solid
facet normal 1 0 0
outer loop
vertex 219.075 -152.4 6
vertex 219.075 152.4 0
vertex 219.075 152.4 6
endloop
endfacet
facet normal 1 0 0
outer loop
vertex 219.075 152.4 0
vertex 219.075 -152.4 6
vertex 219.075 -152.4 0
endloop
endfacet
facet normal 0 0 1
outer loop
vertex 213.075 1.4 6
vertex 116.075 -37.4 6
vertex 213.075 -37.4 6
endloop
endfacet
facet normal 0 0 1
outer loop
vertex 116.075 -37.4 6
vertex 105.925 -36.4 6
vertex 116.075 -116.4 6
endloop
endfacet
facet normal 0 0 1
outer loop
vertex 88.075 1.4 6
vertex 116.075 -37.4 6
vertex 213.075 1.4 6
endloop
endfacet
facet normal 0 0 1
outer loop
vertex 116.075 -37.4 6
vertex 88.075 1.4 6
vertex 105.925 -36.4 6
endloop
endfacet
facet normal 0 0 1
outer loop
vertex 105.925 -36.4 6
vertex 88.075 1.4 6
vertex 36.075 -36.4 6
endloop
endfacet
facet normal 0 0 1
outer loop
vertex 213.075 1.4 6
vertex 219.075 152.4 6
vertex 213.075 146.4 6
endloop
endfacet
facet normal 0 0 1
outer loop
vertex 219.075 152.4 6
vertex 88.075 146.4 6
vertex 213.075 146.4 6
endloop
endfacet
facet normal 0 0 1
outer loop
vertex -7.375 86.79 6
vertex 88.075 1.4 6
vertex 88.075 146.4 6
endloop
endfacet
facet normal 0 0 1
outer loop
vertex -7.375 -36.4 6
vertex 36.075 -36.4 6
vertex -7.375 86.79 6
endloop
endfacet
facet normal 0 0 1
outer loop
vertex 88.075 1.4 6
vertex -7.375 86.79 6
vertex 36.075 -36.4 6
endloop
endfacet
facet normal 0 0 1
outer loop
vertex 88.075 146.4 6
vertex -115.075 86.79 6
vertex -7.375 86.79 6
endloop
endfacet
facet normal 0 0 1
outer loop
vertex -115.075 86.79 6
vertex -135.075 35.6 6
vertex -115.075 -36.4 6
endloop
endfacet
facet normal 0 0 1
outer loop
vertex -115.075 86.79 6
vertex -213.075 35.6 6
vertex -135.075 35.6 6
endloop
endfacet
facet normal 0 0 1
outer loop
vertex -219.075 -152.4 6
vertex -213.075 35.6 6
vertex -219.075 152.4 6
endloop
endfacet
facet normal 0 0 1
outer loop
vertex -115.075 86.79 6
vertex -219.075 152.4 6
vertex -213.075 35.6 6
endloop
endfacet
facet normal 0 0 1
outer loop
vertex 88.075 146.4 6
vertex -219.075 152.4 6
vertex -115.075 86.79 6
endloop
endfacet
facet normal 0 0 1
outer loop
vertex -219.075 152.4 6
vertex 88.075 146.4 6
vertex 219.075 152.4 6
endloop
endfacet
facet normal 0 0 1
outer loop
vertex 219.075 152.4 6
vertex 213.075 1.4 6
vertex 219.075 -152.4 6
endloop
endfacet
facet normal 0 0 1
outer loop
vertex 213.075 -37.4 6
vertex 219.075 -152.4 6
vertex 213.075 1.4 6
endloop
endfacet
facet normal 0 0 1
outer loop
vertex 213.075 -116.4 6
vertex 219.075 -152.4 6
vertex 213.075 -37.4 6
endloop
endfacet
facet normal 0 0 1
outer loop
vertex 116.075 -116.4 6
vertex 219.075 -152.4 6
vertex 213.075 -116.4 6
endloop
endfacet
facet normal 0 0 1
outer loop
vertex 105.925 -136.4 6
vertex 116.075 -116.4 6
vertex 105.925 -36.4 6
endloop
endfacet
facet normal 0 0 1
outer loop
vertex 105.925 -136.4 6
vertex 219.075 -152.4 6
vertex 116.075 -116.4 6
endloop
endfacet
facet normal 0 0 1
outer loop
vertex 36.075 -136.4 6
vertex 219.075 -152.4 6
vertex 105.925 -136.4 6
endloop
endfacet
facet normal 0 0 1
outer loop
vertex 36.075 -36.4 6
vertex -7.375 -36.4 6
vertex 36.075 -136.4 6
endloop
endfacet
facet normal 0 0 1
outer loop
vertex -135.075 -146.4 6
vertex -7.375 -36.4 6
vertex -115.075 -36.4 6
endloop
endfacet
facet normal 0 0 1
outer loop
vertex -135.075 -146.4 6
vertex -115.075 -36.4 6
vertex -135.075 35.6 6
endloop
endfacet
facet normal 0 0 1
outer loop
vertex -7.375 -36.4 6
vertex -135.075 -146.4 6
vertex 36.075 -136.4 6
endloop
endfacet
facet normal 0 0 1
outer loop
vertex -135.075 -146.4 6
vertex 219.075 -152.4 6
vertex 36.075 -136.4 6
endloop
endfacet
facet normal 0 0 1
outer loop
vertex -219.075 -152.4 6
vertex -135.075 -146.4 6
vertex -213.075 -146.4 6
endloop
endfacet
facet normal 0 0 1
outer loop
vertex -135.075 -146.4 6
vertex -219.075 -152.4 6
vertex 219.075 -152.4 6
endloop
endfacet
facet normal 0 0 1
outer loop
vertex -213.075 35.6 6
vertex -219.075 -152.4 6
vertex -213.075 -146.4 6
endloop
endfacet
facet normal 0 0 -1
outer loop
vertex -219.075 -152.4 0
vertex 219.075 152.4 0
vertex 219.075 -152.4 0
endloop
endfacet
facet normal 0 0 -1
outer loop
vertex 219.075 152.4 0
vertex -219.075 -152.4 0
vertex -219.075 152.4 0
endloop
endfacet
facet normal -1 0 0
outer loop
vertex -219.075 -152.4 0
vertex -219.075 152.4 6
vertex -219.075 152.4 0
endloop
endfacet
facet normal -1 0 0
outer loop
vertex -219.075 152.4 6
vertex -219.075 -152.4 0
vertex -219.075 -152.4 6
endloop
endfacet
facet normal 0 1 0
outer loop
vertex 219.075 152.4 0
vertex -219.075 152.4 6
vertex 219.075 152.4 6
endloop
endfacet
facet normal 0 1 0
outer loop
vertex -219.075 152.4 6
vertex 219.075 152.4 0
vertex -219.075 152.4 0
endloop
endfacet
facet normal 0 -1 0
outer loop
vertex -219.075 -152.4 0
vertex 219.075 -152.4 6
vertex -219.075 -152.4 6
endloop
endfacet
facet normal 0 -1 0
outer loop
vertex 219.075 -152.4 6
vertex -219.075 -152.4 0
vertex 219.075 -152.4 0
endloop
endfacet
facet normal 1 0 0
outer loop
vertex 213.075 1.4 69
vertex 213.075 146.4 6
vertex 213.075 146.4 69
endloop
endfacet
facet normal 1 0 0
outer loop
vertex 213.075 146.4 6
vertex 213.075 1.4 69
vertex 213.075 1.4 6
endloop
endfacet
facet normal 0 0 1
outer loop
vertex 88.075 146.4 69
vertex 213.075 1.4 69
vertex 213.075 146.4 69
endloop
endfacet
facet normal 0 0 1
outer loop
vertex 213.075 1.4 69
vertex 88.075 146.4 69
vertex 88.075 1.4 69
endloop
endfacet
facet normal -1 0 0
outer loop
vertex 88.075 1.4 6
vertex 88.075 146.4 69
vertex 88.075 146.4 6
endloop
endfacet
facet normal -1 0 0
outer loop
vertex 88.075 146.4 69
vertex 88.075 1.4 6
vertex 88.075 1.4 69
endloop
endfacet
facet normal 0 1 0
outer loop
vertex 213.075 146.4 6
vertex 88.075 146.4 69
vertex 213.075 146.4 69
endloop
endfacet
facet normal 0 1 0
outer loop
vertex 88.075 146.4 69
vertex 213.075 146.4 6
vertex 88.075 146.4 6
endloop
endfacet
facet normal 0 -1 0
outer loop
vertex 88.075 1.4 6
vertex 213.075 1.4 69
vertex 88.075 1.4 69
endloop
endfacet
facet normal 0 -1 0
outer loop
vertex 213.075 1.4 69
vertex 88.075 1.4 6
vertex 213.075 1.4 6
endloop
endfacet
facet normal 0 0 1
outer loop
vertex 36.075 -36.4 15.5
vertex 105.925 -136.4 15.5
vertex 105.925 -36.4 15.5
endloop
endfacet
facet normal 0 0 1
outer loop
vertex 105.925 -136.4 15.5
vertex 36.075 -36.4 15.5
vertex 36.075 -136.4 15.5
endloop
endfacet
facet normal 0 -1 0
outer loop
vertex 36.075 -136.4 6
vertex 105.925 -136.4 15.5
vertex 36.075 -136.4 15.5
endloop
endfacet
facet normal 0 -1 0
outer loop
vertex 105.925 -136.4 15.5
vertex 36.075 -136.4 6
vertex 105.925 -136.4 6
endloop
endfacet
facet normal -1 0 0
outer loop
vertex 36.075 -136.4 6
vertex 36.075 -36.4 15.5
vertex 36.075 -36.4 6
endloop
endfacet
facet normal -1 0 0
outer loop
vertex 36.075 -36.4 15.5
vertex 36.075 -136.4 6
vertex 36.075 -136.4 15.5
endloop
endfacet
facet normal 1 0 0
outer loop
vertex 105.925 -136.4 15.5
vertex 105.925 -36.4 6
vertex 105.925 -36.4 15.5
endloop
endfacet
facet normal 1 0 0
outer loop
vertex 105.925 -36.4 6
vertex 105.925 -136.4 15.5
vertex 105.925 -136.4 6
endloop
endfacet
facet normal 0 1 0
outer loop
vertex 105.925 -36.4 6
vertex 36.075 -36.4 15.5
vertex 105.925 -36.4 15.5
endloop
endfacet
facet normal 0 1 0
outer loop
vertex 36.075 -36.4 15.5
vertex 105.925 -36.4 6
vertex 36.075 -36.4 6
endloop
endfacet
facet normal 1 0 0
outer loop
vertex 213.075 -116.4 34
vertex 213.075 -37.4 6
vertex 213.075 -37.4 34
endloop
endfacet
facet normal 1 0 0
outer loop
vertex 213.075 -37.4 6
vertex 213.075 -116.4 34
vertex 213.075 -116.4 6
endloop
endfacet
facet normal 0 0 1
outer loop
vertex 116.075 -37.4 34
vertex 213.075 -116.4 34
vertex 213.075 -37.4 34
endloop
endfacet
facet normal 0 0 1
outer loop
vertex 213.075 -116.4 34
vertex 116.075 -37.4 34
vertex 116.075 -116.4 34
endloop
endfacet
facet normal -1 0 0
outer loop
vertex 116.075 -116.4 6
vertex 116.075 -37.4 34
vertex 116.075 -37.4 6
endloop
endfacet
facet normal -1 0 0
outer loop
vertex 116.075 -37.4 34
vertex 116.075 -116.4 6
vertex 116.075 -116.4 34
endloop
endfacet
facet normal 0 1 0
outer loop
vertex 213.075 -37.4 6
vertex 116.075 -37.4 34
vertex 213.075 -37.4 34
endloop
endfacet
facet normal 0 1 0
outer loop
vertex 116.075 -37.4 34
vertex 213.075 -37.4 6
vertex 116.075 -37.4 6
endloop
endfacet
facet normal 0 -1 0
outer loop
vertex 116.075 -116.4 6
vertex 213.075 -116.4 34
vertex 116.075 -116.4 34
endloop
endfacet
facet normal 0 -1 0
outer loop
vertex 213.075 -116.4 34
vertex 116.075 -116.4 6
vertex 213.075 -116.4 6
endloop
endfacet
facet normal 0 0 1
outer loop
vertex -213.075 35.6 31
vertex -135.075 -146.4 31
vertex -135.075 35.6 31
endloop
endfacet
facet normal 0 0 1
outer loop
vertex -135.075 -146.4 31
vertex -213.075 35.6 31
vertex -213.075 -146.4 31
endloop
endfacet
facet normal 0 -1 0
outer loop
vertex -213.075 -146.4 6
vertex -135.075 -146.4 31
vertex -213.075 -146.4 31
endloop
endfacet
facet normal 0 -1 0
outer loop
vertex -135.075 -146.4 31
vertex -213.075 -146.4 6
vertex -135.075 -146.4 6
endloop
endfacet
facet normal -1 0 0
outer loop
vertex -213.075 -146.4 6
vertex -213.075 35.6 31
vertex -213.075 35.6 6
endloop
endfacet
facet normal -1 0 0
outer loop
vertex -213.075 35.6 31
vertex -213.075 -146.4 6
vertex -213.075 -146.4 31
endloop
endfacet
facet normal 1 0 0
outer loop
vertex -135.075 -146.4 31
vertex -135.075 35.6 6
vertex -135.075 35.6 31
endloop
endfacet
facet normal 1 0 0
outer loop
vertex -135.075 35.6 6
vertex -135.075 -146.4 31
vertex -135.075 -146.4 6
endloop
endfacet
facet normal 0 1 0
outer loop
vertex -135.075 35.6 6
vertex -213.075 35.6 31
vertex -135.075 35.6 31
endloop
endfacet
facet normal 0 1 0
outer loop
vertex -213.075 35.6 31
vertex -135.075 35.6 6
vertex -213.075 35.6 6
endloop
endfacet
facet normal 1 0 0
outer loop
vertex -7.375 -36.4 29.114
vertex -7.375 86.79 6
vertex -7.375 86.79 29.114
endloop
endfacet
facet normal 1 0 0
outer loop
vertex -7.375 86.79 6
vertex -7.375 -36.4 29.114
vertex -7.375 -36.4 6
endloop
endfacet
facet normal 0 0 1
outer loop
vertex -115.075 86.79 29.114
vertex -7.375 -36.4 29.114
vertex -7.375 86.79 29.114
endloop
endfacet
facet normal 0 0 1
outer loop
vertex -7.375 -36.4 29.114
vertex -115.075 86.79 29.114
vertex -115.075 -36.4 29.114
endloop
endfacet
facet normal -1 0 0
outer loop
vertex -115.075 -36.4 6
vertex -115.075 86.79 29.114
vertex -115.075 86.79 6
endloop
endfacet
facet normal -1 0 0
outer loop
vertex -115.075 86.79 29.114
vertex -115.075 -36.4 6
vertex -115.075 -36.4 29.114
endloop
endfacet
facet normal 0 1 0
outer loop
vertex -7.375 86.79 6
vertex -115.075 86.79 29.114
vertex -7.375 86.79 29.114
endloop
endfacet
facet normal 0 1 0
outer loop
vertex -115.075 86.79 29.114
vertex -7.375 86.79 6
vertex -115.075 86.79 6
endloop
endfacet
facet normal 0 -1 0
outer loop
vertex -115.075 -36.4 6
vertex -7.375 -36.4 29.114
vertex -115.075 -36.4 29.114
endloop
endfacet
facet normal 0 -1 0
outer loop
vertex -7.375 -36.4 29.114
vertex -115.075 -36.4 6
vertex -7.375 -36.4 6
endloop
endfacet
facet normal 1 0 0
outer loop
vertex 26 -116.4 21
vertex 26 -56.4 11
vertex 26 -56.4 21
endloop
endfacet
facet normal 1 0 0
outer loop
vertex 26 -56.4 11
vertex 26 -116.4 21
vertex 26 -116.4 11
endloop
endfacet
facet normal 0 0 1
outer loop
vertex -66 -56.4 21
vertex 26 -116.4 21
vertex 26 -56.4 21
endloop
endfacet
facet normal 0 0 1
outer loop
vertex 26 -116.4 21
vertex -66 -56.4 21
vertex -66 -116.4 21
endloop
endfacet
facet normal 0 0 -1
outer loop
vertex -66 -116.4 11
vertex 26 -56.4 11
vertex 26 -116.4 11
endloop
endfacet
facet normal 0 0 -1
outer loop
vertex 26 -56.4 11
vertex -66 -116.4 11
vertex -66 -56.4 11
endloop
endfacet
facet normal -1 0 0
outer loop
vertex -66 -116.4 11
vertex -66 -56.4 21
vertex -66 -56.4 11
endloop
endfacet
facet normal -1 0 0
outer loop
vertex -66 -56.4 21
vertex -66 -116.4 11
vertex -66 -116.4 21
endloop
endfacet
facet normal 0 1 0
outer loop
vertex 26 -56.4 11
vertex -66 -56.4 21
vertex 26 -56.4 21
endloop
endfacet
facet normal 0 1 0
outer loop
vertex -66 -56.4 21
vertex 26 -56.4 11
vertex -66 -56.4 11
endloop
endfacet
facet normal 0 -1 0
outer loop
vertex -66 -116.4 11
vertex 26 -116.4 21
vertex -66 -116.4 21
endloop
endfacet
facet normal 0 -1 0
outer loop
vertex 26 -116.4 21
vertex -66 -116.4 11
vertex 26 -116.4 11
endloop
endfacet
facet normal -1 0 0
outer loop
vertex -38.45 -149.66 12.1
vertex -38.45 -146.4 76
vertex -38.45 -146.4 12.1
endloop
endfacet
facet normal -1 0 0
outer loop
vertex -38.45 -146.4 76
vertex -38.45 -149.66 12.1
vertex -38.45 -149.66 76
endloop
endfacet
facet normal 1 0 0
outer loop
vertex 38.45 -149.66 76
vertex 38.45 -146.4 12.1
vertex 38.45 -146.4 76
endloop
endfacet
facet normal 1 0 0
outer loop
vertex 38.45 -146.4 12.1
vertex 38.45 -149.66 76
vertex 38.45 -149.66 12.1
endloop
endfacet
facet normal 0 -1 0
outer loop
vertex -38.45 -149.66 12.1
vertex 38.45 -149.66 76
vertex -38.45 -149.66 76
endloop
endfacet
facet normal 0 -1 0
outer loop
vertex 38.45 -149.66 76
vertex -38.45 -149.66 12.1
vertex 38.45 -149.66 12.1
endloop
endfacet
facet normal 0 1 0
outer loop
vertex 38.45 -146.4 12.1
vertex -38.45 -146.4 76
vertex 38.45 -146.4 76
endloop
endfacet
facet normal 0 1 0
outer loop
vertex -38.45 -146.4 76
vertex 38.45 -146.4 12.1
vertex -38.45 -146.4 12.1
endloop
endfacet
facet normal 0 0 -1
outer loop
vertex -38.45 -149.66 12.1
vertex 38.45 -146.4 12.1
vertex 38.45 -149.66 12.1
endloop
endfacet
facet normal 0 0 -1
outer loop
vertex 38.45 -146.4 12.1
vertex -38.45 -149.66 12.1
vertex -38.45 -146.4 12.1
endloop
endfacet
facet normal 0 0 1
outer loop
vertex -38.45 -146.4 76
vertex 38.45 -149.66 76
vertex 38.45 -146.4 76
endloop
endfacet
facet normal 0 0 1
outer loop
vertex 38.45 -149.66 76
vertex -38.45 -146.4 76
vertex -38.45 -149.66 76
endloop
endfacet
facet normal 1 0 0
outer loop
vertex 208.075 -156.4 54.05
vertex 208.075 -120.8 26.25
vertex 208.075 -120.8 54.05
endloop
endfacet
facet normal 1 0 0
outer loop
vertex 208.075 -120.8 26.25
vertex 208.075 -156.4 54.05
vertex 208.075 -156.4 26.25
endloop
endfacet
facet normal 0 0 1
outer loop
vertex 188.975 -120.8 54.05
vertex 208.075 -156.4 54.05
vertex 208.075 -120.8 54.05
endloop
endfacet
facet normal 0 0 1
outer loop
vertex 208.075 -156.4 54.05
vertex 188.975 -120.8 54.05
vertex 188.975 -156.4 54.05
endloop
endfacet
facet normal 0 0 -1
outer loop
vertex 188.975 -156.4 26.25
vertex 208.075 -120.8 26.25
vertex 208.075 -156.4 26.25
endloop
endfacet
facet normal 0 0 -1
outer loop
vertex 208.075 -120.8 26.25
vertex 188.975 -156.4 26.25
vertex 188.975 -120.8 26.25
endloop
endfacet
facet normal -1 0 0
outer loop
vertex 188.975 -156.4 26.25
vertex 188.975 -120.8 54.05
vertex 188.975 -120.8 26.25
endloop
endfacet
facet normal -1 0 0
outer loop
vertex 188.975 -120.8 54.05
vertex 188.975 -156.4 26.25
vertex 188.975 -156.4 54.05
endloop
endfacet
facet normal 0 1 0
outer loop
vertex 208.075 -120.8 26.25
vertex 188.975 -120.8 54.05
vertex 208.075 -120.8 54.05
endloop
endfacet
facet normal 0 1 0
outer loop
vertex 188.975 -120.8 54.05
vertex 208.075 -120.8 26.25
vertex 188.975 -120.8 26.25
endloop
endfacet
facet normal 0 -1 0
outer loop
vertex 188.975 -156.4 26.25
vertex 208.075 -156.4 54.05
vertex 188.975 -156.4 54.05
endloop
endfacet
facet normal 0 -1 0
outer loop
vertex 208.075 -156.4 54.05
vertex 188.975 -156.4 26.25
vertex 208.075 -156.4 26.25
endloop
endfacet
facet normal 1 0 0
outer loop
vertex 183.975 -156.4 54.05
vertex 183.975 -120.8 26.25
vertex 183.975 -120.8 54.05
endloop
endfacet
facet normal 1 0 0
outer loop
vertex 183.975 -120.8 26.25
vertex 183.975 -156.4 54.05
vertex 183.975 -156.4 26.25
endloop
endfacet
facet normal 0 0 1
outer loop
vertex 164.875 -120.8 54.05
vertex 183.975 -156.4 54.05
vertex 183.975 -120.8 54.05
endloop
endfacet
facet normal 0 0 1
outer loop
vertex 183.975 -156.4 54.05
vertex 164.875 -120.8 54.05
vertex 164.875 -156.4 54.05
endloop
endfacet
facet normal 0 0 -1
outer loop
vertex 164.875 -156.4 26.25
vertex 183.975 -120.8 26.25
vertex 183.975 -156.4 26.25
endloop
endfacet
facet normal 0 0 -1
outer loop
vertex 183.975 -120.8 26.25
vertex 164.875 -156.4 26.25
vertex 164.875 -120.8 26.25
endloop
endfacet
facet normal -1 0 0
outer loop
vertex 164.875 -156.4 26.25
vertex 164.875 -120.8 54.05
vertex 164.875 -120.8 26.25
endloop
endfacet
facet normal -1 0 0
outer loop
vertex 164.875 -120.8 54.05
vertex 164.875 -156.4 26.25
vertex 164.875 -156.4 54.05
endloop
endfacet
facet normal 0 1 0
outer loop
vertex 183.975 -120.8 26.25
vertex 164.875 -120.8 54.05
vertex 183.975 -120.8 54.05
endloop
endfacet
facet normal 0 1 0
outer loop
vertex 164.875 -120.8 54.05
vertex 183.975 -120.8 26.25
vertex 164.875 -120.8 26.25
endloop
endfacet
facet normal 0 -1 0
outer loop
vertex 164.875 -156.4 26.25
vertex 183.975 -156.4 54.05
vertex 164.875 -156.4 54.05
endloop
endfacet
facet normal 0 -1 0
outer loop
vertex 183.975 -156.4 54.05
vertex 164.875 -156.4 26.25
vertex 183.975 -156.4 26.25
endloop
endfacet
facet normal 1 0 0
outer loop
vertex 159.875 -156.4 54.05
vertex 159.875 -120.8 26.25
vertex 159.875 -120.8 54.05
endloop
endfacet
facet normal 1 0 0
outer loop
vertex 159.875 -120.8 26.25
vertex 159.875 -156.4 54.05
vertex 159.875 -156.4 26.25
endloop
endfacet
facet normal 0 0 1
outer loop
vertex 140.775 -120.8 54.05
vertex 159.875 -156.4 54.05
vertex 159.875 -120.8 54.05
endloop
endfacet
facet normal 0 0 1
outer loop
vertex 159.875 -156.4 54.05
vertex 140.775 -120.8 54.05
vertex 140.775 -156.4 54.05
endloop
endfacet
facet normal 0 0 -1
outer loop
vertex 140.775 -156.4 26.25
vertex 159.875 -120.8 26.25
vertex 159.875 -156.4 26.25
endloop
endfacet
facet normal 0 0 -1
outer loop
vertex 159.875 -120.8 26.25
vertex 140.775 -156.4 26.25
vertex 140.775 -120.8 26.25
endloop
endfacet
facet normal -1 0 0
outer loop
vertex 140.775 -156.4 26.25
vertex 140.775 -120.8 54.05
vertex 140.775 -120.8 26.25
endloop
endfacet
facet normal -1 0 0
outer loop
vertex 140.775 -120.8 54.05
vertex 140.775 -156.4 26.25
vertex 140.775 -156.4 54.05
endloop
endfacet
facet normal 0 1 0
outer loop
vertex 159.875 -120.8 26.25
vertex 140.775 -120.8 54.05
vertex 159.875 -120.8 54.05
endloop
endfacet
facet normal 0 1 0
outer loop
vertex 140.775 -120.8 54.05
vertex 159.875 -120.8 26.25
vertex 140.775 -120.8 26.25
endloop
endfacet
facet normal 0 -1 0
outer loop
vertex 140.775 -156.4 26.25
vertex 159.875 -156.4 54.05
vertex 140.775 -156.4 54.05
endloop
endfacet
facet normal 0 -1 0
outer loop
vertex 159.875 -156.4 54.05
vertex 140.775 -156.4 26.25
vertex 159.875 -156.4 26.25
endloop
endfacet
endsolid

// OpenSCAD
//Global case size variables
acrylic=6;
case_width=438.15;//17.25" rack unit width
case_height=88.1;//2U rack height
case_depth=304.8;//1/2 24" rack depth

//Case panels: naive approximations for now
front_panel_height=case_height-2*acrylic;
module front_panel(){
    cube([case_width,front_panel_height,acrylic]);
}

module back_panel(){
    cube([case_width,case_height,acrylic]);
}

module top_panel(){
    cube([case_width, case_depth, acrylic]);
}

module bottom_panel(){
    color("black") cube([case_width, case_depth, acrylic]);
}

module side_panel(){
    cube([case_depth,case_height,acrylic]); 
}

// Parts inside the case
// These need to stay global because they're used in the scene as well.
psu_width=125;
psu_height=63;
psu_depth=145;

module psu(){
    color("red")
        cube([psu_width,psu_depth,psu_height]);
    translate([psu_width/2, psu_depth/2, psu_height])
        color("yellow") {
            text(halign="center", valign="center", text="PSU");
       }
}

module ssd_25_inch(){
    //9.5mm is most common
    width=100;
    depth=69.85;
    height=9.5;
    color("green")
        cube([width,depth,height]);
    translate([width/2, depth/2, height])
        color("yellow") {
            text(halign="center", valign="center", text="SSD");
        }
}

ethernet_switch_width=97;
ethernet_switch_depth=79;
ethernet_switch_height=28;
module ethernet_switch(){
    color("red")
        cube([ethernet_switch_width,ethernet_switch_depth,ethernet_switch_height]);
    translate([ethernet_switch_width/2, ethernet_switch_depth/2, ethernet_switch_height])
        color("yellow") {
            text(halign="center", valign="center", text="Ethernet");
        }
}

module vga_splitter(){
    //approximation
    width=66;
    depth=61;
    height=23;
    color("red")
        cube([width,depth,height]);
    translate([width/2, depth/2, height])
        color("yellow") {
            text(halign="center", valign="center", text="VGA Split");
        }
}

vga_hdmi_converter_width=182;
vga_hdmi_converter_depth=78;
vga_hdmi_converter_height=25;
module vga_hdmi_converter(){
    color("pink")
        cube([vga_hdmi_converter_width,vga_hdmi_converter_depth,vga_hdmi_converter_height]);
    translate([vga_hdmi_converter_width/2, vga_hdmi_converter_depth/2, vga_hdmi_converter_height])
        color("black") {
            text(halign="center", valign="center", text="VGA->HDMI");
        }
}

module h264_encoder(){
    width=107.70;
    depth=123.19;
    height=23.114;
    color("purple")
        cube([width,depth,height]);
    translate([width/2, depth/2, height])
        color("yellow") {
            text(halign="center", valign="center", text="H264 Enc.");
        }
}

banana_pi_width=92;
banana_pi_depth=60;
banana_pi_height=10; //just a wild guess for now
module banana_pi(){
    color("yellow")
        cube([banana_pi_width,banana_pi_depth,banana_pi_height]);
    translate([banana_pi_width/2, banana_pi_depth/2, banana_pi_height])
        color("red") {
            text(halign="center", valign="center", text="BPI");
        }
}

lcd_width=76.9;
lcd_height_nt=63.9;
lcd_height_t=65.3;
lcd_depth=3.26;
// Setting these so we can just change it here
lcd_height = lcd_height_nt;
// lcd_height = lcd_height_t;
module banana_pi_lcd(){
    color("blue")
        cube([lcd_width,lcd_height,lcd_depth]); //non-touch
    translate([lcd_width/2, lcd_height/2, lcd_depth])
        color("yellow") {
            text(halign="center", valign="center", text="LCD");
        }

}

ethernet_coupler_width=19.1;
ethernet_coupler_height=35.6;
ethernet_coupler_depth=27.8;
module ethernet_coupler(){
    //just an example from http://www.l-com.com/multimedia/eng_drawings/ECF504-C5.pdf
    color("red")
        cube([ethernet_coupler_width,ethernet_coupler_height,ethernet_coupler_depth]);
    translate([ethernet_coupler_width/2, ethernet_coupler_height/2, ethernet_coupler_depth])
        color("yellow") {
            text(halign="center", valign="center", size=5, text="8P8C");
        }
}

translate([-case_width/2, -case_depth/2, 0]) {
    bottom_panel();
    % translate([0,0,case_height-acrylic])
        top_panel();
    translate([case_width-psu_width-acrylic,case_depth-psu_depth-acrylic,acrylic])
        psu();
    % translate([0,acrylic,acrylic])
        rotate([90,0,0])
            front_panel();
    translate([325,acrylic+10,0])
        rotate([0,0,90])
            translate([0,0,acrylic])
                ssd_25_inch();
    translate([case_width-ethernet_switch_width-acrylic,acrylic+30,acrylic])
        ethernet_switch();
    // translate([??,??,??])
    //     vga_splitter();
    translate([vga_hdmi_converter_depth+acrylic,acrylic,acrylic])
        rotate([0,0,90])
            vga_hdmi_converter();
    translate([acrylic+vga_hdmi_converter_depth+20,acrylic+110,acrylic])
        h264_encoder();
    translate([(case_width-banana_pi_width)/2-20, acrylic+30, acrylic+5])
        banana_pi();
    translate([(case_width-lcd_width)/2,acrylic,acrylic+(front_panel_height-lcd_height)/2])
        rotate([90,0,0])
            banana_pi_lcd();
    translate([case_width-acrylic -(ethernet_coupler_width+5),-4,acrylic+(front_panel_height-ethernet_coupler_height)/2])
        ethernet_coupler();
    translate([case_width- acrylic - 2*(ethernet_coupler_width+5),-4,acrylic+(front_panel_height-ethernet_coupler_height)/2])
        ethernet_coupler();
    translate([case_width- acrylic - 3*(ethernet_coupler_width+5),-4,acrylic+(front_panel_height-ethernet_coupler_height)/2])
        ethernet_coupler();
}
